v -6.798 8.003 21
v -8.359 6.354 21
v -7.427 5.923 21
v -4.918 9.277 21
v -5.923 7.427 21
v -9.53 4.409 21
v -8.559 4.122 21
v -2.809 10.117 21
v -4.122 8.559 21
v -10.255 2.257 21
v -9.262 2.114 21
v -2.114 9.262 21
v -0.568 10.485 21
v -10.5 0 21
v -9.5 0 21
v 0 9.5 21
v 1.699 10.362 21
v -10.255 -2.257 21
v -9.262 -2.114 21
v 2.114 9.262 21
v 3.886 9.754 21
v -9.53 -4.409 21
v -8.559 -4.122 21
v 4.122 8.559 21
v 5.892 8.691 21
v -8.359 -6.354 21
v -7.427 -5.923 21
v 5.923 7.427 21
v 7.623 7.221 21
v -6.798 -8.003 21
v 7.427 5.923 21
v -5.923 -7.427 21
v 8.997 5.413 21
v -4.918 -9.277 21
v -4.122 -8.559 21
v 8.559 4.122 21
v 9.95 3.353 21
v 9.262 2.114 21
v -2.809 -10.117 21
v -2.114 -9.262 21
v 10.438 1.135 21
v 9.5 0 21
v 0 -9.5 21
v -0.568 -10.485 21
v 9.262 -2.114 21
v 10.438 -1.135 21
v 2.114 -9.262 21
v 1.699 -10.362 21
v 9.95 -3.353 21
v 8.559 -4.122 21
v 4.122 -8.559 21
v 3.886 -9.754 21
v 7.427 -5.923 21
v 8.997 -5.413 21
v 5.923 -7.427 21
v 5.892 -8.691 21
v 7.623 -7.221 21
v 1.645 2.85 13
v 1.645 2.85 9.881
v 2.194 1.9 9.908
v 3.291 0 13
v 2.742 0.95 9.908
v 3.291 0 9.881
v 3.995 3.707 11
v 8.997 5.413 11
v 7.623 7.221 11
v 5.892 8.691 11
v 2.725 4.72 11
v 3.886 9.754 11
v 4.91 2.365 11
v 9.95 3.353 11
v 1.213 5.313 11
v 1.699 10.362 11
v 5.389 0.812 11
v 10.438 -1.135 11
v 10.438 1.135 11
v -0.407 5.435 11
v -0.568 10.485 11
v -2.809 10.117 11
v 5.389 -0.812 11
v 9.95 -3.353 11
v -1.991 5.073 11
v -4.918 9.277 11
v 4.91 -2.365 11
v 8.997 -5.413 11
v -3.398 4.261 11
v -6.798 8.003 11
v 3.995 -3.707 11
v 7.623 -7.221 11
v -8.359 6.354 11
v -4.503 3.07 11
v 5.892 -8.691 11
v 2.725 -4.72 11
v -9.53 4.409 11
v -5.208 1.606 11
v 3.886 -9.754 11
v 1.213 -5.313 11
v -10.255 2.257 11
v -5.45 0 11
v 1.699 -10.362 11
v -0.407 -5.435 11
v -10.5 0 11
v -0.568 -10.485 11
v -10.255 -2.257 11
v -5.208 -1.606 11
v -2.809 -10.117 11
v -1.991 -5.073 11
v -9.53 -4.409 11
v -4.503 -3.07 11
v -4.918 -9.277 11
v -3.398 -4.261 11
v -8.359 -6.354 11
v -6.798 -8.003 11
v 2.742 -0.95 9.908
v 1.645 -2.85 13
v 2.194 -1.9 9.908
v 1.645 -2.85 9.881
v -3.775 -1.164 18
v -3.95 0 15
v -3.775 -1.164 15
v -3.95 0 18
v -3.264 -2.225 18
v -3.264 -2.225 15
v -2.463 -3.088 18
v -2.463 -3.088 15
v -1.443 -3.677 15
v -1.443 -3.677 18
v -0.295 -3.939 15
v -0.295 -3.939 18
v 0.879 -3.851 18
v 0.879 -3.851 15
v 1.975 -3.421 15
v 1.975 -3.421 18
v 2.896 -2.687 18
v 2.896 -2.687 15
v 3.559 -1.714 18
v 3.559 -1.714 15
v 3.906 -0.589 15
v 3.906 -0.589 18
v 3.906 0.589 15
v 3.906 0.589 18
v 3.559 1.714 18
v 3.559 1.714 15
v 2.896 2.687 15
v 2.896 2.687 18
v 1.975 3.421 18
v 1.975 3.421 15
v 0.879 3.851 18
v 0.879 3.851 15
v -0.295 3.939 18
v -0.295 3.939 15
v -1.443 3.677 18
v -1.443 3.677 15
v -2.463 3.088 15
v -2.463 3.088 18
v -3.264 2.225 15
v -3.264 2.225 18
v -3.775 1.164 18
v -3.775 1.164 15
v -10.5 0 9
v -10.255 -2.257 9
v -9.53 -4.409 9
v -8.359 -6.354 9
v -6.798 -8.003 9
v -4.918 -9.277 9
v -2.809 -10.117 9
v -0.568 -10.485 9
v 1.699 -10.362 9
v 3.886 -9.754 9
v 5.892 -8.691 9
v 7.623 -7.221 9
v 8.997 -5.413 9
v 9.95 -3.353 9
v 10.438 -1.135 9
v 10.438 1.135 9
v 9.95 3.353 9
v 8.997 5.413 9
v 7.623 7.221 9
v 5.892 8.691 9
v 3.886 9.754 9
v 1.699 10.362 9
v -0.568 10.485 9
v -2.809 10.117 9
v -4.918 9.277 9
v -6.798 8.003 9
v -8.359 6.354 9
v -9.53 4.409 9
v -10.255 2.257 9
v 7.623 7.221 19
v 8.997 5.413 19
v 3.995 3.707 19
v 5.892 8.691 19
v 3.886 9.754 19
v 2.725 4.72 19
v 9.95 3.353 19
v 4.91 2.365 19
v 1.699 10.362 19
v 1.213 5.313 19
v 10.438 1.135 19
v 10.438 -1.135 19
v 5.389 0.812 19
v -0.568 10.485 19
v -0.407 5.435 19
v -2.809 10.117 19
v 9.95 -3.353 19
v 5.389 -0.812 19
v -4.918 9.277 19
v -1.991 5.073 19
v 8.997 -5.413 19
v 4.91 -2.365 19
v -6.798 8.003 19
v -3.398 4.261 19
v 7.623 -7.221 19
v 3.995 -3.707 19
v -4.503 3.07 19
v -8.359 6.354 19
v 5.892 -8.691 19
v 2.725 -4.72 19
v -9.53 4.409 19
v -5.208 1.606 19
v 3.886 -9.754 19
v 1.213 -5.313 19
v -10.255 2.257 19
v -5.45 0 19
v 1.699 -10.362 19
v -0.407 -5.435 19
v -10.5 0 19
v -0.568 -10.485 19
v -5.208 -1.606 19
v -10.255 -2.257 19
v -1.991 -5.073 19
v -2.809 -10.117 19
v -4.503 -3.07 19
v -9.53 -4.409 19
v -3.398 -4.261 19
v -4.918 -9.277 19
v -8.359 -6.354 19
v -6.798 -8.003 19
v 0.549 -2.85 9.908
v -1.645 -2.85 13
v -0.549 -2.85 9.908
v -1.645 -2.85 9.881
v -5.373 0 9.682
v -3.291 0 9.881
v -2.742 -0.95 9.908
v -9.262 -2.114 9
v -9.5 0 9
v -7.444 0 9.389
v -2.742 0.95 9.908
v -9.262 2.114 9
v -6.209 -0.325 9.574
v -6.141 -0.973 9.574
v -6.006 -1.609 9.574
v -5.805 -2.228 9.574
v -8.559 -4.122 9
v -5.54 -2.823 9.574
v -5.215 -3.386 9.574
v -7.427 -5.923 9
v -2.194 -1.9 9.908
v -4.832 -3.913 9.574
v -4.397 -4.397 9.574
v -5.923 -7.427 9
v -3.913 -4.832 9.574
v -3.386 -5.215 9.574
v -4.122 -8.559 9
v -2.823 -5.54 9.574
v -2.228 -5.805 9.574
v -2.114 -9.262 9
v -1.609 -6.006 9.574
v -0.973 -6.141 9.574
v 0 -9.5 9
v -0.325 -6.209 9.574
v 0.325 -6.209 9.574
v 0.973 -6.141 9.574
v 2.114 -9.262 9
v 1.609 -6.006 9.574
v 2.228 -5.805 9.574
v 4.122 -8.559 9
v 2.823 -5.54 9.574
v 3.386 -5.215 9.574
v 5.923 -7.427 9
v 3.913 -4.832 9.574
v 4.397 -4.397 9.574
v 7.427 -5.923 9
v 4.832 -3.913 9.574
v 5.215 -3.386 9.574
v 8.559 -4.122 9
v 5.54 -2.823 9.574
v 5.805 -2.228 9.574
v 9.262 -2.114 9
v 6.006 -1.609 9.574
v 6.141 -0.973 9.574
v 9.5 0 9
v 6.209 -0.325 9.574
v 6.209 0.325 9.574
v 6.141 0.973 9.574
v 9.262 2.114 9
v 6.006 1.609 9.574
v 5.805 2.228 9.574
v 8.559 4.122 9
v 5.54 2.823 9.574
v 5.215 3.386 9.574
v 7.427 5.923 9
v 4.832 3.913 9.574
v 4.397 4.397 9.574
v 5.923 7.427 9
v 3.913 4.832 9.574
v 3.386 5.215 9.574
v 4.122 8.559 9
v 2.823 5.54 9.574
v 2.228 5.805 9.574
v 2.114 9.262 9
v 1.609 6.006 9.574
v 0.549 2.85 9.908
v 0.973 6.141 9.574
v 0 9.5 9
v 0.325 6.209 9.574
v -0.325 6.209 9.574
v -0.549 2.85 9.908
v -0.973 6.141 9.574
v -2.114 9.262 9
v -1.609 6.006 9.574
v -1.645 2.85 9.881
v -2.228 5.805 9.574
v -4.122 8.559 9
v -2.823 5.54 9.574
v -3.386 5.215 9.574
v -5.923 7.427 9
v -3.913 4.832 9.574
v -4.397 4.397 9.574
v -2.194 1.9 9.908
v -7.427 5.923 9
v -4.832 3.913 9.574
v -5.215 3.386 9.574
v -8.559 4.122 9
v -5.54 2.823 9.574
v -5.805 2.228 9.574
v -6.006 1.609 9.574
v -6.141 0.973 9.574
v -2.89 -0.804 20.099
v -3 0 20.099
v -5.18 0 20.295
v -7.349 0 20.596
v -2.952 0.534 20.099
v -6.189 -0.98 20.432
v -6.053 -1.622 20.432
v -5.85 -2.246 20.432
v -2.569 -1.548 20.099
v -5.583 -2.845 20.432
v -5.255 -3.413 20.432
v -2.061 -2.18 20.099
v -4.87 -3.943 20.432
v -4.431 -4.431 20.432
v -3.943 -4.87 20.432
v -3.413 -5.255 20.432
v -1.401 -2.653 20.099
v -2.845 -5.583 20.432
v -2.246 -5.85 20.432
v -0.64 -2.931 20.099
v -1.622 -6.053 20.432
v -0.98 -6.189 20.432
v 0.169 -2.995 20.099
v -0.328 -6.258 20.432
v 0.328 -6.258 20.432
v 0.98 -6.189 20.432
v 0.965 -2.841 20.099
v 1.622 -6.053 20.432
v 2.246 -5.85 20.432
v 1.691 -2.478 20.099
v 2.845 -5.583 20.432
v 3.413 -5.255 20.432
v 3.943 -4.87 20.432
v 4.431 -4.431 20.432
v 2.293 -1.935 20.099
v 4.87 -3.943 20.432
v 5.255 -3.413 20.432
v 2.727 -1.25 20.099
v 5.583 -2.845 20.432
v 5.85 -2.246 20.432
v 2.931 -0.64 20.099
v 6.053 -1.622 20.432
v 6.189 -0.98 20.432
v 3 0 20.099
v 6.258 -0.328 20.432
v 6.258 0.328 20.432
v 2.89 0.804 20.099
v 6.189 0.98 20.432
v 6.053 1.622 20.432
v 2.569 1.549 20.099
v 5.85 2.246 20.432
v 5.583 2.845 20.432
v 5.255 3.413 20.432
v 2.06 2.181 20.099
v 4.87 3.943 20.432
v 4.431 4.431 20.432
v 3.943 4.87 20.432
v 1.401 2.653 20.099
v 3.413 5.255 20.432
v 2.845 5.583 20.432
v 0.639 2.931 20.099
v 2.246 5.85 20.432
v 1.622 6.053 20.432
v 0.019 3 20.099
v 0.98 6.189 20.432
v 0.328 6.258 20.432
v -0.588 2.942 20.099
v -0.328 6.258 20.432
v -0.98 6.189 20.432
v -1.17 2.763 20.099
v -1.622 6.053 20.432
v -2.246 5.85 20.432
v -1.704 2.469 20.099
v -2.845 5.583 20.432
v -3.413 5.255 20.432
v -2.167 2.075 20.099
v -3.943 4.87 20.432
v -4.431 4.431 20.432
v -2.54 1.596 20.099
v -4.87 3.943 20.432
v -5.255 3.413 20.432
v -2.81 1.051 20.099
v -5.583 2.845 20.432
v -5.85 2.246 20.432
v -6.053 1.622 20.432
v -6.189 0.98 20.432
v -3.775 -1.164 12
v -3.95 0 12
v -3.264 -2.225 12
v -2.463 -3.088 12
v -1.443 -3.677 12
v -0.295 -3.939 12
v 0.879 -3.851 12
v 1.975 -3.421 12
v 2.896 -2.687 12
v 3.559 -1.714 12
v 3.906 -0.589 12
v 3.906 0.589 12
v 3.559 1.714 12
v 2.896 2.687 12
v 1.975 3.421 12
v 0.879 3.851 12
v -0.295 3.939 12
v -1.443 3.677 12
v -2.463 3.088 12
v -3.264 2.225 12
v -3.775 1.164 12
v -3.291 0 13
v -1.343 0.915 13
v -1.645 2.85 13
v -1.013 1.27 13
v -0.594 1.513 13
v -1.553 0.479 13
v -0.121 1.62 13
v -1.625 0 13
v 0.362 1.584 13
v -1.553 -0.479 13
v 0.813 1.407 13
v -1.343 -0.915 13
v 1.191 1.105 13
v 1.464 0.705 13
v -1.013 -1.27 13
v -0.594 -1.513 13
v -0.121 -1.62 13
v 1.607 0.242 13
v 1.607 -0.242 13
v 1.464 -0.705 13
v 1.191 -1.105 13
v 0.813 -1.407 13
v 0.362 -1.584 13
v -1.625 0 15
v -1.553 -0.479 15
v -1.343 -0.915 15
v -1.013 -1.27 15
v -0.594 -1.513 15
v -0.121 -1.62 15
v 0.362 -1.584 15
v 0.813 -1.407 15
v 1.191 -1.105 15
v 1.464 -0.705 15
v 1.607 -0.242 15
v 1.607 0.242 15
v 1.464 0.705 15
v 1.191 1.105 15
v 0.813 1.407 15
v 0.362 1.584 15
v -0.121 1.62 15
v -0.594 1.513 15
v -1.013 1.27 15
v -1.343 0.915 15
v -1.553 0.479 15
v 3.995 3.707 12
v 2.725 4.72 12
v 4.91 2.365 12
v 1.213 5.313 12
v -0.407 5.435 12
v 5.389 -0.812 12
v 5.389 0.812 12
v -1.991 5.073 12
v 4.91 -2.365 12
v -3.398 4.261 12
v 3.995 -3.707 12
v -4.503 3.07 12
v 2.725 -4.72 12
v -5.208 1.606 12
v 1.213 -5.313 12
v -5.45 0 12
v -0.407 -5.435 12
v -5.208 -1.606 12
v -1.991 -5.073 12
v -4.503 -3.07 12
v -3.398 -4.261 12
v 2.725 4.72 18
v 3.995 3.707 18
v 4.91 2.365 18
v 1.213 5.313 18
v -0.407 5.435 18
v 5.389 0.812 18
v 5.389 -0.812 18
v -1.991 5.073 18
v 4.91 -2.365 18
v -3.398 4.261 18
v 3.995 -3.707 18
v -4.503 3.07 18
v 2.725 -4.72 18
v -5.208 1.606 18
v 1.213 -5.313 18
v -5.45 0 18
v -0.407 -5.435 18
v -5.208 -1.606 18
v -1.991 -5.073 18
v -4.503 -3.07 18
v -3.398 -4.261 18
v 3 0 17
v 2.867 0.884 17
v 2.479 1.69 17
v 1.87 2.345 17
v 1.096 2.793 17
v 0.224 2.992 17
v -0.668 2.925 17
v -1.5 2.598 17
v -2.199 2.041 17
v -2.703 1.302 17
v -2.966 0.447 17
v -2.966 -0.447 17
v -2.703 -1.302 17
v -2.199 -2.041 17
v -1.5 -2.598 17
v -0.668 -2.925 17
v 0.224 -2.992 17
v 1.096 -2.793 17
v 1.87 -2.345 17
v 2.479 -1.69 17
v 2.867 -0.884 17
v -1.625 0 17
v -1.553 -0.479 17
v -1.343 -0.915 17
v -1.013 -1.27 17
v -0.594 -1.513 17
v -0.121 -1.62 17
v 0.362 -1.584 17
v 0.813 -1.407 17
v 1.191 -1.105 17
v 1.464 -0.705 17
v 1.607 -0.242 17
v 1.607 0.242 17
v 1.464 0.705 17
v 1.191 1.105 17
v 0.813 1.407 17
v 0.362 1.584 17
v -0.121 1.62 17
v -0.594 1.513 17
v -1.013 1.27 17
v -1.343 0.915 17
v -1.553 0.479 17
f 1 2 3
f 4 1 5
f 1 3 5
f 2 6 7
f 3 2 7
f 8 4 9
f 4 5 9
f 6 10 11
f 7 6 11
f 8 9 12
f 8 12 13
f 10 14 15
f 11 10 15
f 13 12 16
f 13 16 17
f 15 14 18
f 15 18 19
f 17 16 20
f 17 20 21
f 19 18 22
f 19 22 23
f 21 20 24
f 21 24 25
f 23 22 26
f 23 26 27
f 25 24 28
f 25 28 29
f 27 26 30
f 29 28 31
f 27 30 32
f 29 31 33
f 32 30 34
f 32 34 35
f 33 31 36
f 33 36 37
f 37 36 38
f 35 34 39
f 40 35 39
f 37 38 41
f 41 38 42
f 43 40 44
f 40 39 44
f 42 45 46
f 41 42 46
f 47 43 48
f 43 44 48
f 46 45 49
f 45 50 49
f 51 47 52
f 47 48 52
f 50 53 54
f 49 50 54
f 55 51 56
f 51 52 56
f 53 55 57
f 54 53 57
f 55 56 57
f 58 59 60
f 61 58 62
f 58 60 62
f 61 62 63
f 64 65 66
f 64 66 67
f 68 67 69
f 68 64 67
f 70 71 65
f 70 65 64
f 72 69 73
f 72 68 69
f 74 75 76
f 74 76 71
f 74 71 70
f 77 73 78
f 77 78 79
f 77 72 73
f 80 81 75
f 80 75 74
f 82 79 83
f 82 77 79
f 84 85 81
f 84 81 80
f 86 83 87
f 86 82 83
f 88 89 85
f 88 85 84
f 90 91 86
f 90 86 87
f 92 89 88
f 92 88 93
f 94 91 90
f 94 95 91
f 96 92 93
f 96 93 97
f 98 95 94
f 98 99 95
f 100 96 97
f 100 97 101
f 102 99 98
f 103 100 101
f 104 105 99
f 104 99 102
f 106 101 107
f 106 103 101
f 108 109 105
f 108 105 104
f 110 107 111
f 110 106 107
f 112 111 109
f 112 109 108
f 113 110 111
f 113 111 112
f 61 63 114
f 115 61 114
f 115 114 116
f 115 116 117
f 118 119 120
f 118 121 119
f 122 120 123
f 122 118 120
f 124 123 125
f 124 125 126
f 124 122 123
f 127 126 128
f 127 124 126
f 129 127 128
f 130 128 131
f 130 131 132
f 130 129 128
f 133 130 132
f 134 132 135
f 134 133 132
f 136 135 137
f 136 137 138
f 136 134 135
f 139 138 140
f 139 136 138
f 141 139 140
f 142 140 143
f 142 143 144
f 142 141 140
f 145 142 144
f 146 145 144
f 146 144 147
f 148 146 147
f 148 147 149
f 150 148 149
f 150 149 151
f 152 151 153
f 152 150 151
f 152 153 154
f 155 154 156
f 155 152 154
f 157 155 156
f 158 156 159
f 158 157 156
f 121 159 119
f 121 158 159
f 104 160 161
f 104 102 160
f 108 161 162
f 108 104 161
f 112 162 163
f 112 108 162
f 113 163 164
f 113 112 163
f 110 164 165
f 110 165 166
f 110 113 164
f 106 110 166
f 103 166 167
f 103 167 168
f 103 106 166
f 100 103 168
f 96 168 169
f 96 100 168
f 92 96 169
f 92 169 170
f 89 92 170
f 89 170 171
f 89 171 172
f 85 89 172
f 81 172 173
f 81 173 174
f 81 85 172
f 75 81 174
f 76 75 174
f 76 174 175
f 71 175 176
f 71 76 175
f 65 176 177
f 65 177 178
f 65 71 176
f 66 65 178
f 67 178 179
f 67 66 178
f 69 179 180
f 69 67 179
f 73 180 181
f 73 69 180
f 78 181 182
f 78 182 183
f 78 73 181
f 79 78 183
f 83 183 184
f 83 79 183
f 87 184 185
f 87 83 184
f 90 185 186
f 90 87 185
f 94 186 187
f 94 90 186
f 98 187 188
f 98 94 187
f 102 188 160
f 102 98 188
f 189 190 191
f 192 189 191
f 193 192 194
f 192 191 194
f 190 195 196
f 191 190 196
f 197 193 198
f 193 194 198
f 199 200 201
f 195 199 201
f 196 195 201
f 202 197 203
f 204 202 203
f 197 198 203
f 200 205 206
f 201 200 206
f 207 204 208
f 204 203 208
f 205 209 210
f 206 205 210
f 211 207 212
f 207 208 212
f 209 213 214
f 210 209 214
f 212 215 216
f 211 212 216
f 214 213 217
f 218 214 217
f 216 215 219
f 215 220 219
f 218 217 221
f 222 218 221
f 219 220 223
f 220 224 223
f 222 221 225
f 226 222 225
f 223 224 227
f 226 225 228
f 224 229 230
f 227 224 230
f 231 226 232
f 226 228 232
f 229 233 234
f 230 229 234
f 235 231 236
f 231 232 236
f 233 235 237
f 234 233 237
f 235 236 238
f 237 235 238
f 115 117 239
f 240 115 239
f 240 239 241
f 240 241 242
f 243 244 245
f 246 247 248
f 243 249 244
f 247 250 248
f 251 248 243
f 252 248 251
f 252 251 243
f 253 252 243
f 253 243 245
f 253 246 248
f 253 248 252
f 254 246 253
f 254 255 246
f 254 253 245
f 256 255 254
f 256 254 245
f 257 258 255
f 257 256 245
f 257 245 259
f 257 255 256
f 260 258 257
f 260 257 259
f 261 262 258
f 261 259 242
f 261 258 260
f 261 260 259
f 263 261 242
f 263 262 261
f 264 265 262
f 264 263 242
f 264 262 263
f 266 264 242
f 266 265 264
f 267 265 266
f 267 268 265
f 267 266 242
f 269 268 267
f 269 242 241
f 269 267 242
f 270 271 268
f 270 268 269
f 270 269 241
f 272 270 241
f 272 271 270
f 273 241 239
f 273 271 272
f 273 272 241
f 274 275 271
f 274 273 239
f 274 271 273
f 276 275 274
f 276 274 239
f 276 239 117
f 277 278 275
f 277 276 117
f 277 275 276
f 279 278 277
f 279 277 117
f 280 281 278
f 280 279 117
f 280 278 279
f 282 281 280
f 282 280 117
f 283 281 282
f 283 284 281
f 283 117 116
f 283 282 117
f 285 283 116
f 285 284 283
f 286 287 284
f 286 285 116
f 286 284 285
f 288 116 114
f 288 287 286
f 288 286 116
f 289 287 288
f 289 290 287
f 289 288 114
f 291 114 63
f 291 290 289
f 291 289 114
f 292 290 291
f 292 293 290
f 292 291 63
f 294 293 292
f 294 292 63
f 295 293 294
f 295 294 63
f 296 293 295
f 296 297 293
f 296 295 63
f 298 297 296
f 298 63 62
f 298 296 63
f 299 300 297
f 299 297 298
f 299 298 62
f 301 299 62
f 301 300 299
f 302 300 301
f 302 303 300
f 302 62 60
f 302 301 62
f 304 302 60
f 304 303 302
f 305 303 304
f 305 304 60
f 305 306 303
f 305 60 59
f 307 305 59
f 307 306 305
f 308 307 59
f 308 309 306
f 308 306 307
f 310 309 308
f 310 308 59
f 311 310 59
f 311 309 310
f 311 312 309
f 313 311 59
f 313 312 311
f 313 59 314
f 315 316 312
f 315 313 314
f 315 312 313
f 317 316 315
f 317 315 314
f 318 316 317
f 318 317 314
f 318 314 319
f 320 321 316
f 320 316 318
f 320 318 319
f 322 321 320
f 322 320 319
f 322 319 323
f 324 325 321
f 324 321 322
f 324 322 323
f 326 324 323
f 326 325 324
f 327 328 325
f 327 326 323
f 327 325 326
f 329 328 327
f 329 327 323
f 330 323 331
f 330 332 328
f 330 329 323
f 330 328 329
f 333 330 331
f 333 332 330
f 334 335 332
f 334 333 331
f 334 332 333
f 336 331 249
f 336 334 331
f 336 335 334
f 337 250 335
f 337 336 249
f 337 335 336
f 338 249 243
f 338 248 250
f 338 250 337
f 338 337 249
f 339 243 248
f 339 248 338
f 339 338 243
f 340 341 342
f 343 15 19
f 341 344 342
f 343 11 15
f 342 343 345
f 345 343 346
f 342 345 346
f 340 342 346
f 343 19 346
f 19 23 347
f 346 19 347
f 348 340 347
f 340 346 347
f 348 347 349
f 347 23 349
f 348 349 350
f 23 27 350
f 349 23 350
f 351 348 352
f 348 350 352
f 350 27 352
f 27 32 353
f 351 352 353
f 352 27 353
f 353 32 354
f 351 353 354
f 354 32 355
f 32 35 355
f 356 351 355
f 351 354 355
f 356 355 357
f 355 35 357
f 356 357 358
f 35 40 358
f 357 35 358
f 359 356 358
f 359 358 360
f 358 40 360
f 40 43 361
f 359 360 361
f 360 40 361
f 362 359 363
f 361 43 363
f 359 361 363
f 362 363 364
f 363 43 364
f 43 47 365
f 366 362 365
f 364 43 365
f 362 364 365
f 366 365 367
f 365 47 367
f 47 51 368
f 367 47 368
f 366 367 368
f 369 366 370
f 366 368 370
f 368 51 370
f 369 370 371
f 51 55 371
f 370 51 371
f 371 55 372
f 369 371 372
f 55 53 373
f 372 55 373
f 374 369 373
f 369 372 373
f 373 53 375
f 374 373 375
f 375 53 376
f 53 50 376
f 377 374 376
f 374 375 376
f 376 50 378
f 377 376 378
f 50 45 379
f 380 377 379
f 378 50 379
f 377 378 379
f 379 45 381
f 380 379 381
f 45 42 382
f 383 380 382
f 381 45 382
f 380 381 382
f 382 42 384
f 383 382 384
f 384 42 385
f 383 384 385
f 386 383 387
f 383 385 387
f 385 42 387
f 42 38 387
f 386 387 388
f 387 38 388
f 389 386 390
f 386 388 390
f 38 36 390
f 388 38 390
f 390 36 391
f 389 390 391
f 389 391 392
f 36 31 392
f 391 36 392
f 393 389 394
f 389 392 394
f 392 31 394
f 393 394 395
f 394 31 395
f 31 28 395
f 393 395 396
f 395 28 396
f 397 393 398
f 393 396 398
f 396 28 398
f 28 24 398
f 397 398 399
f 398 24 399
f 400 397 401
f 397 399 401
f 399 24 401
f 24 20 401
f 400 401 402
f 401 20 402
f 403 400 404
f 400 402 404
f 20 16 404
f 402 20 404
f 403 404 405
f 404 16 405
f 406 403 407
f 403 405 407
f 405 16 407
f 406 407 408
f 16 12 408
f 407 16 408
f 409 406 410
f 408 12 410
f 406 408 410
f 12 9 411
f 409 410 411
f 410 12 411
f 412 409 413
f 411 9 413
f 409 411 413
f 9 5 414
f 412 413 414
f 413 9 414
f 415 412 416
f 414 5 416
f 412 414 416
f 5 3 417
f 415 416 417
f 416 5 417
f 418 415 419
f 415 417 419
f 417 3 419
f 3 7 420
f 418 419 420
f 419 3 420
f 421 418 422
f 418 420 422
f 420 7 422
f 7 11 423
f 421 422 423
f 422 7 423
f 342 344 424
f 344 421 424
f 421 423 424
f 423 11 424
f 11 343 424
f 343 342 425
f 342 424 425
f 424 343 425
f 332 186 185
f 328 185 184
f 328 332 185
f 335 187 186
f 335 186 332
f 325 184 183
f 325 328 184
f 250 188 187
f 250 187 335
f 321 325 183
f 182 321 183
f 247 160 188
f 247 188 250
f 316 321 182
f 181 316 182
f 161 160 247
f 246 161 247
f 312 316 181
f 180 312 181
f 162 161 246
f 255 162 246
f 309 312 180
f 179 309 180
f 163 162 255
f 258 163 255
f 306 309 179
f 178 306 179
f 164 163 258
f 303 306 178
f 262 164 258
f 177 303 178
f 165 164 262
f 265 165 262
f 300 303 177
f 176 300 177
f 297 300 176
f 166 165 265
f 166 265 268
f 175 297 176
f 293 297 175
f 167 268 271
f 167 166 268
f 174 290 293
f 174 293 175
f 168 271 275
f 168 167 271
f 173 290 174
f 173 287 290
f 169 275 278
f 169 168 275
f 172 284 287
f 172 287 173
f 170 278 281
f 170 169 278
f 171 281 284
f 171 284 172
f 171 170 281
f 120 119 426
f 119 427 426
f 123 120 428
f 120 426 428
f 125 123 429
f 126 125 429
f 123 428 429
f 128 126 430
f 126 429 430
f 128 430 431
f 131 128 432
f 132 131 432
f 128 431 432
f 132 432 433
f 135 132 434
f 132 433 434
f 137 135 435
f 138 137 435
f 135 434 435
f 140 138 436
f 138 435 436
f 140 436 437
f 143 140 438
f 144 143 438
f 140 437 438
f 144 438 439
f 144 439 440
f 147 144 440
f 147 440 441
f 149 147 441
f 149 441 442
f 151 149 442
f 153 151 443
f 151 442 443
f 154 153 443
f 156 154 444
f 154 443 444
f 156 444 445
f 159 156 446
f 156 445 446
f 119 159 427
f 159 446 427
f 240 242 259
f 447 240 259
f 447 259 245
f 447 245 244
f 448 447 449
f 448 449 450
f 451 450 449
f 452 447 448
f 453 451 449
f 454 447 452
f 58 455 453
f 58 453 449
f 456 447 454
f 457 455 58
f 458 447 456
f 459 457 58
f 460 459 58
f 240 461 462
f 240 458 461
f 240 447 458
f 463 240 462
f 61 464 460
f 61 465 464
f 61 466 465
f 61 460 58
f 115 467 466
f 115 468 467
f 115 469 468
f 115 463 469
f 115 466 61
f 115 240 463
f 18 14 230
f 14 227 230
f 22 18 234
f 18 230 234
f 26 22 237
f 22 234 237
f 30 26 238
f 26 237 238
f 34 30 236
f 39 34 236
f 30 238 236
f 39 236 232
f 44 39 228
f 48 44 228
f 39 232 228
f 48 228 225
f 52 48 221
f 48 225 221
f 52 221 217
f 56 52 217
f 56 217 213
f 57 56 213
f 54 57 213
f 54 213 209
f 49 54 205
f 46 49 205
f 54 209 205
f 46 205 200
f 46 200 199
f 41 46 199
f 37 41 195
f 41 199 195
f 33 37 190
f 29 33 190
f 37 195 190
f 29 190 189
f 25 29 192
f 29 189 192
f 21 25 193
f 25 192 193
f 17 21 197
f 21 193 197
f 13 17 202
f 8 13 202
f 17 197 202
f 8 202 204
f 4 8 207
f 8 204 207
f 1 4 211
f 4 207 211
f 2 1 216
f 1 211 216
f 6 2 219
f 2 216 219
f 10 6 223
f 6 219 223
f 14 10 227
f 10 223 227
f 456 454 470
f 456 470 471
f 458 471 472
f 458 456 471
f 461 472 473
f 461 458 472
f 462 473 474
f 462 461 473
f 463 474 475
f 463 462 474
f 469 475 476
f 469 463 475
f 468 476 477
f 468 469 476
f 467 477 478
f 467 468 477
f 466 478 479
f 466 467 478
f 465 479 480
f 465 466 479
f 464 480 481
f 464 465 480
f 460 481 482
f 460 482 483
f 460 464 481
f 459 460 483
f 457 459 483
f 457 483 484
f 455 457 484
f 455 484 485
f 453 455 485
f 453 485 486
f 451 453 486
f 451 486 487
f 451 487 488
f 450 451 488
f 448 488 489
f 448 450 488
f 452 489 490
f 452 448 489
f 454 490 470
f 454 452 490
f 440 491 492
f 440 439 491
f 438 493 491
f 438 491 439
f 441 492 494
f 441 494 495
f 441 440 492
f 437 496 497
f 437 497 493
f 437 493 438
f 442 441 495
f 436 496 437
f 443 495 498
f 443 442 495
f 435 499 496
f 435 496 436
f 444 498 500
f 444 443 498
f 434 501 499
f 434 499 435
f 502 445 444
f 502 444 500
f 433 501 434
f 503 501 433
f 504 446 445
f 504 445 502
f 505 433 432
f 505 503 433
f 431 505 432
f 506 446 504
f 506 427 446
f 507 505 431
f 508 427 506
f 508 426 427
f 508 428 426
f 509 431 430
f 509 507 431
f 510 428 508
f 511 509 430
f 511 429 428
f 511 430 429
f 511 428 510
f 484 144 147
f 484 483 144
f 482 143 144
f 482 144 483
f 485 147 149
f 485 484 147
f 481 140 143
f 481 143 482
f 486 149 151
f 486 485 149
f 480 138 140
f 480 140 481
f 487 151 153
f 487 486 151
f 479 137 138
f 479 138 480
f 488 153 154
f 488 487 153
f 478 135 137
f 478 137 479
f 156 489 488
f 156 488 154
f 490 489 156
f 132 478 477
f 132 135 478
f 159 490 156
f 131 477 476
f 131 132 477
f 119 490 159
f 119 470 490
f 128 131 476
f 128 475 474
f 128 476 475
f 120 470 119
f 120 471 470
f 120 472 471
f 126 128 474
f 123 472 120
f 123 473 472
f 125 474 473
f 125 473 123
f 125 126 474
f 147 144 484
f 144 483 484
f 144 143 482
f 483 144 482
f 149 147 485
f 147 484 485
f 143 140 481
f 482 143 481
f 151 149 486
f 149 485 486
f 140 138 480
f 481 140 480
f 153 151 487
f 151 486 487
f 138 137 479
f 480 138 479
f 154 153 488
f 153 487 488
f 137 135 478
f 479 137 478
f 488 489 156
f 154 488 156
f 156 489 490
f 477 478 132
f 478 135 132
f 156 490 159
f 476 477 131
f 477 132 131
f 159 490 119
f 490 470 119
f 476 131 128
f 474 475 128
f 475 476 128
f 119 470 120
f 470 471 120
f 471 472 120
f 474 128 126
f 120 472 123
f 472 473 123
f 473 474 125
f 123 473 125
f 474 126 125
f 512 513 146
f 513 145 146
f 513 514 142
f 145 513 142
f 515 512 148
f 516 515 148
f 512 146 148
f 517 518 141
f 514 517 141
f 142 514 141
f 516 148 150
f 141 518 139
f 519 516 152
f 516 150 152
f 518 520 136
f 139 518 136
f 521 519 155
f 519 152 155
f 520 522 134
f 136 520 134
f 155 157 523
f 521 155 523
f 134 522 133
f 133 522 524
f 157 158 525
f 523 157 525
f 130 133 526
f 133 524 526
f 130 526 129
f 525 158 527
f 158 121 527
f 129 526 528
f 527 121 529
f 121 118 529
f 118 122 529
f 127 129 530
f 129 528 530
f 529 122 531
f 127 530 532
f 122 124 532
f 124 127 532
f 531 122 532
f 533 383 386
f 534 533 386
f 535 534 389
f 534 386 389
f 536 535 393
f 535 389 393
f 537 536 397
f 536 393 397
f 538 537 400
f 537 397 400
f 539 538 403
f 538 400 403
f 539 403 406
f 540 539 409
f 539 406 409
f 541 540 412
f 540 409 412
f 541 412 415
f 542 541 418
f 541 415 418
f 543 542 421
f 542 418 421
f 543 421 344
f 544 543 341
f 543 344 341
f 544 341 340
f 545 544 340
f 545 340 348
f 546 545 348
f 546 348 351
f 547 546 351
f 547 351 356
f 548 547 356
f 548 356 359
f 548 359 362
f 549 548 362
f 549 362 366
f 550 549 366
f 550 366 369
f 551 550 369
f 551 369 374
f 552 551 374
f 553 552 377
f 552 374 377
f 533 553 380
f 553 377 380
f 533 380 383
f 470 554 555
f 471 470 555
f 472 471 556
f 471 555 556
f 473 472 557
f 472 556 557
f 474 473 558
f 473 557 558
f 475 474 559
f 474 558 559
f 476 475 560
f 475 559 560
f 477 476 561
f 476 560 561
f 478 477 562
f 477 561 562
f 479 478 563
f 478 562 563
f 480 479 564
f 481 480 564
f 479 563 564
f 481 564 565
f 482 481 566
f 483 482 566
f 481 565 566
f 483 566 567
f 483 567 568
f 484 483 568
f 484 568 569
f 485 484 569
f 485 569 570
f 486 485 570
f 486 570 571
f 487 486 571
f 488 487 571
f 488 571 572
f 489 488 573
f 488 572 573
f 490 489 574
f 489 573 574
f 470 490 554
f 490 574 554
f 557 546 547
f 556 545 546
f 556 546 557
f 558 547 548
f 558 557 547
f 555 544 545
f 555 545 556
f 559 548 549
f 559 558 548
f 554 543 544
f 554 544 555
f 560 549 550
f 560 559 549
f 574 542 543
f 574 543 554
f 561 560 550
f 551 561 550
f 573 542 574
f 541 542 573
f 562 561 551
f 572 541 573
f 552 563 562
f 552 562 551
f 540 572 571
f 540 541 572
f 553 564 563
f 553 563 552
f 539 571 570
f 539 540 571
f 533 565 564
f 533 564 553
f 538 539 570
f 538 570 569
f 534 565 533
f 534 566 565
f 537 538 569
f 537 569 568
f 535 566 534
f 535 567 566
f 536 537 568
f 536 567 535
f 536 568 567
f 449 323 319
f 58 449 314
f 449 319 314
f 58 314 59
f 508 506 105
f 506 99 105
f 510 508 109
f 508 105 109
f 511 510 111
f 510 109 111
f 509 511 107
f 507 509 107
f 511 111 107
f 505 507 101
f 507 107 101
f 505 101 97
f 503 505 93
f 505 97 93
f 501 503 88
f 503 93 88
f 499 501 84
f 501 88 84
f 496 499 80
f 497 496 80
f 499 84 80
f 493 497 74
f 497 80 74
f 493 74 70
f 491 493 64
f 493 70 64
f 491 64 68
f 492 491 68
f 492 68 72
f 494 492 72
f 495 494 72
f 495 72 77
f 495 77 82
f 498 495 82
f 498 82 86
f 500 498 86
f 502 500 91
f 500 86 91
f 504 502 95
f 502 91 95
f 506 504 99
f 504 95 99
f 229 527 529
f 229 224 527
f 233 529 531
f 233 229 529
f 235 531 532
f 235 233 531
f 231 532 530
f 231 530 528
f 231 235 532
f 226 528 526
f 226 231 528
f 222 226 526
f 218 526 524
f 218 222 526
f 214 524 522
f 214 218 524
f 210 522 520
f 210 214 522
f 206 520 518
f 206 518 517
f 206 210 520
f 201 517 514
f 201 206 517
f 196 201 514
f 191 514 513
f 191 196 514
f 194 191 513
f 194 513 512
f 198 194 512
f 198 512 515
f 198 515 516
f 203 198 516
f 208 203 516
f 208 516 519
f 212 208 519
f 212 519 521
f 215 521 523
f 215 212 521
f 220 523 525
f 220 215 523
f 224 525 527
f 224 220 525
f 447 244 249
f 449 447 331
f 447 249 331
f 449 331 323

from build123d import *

# Parameters (mm, degrees)
F0_W     = 1.5
F0_H     = 1
F0_W_2   = 2.325
F0_H_2   = 3
F3_R     = 3
F4_DEPTH = 4
F6_DEPTH = 4


with BuildPart() as f1:
    # F0 (on Front) → F1 (revolve)
    with BuildSketch(Plane.XZ):
        with BuildLine():
            Line((-3.95, 19), (0, 19))
            Line((0, 19), (0, 20))
            ThreePointArc((0, 20), (-4.7762432936, 20.2506887105), (-9.5, 21))
            Line((-9.5, 21), (-10.5, 21))
            Line((-10.5, 21), (-10.5, 19))
            Line((-10.5, 19), (-5.45, 19))
            Line((-5.45, 19), (-3.95, 19))
        make_face()
        with Locations((-4.7, 18.5)):
            Rectangle(F0_W, F0_H)
        Polygon((-1, 18), (0, 18), (0, 19), (-3.95, 19), (-3.95, 18), (-1.625, 18), align=None)
        with Locations((-2.7875, 16.5)):
            Rectangle(F0_W_2, F0_H_2)
    revolve(axis=Axis((0, 0, 17), (0, 0, 1)))


with BuildPart() as f2_1:
    # F2: instance of F1
    add(f1.part.mirror(Plane(origin=(0, 0, 15), x_dir=(1, 0, 0), z_dir=(0, 0, -1))))

    # F5 (on face) → F6 (cut)
    with BuildSketch(Plane(origin=(0, 0, 9), x_dir=(1, 0, 0), z_dir=(0, 0, -1))):
        Polygon((1.6454482672, 2.85), (-1.6454482672, 2.85), (-3.2908965344, 0), (-1.6454482672, -2.85), (1.6454482672, -2.85), (3.2908965344, 0), align=None)
    extrude(amount=-F6_DEPTH, mode=Mode.SUBTRACT)


with BuildPart() as f1_1:
    add(f1.part)

    # F3 (on face) → F4 (cut)
    with BuildSketch(Plane.XY.offset(21)):
        Circle(F3_R)
    extrude(amount=-F4_DEPTH, mode=Mode.SUBTRACT)


solid = Compound([f2_1.part, f1_1.part])
